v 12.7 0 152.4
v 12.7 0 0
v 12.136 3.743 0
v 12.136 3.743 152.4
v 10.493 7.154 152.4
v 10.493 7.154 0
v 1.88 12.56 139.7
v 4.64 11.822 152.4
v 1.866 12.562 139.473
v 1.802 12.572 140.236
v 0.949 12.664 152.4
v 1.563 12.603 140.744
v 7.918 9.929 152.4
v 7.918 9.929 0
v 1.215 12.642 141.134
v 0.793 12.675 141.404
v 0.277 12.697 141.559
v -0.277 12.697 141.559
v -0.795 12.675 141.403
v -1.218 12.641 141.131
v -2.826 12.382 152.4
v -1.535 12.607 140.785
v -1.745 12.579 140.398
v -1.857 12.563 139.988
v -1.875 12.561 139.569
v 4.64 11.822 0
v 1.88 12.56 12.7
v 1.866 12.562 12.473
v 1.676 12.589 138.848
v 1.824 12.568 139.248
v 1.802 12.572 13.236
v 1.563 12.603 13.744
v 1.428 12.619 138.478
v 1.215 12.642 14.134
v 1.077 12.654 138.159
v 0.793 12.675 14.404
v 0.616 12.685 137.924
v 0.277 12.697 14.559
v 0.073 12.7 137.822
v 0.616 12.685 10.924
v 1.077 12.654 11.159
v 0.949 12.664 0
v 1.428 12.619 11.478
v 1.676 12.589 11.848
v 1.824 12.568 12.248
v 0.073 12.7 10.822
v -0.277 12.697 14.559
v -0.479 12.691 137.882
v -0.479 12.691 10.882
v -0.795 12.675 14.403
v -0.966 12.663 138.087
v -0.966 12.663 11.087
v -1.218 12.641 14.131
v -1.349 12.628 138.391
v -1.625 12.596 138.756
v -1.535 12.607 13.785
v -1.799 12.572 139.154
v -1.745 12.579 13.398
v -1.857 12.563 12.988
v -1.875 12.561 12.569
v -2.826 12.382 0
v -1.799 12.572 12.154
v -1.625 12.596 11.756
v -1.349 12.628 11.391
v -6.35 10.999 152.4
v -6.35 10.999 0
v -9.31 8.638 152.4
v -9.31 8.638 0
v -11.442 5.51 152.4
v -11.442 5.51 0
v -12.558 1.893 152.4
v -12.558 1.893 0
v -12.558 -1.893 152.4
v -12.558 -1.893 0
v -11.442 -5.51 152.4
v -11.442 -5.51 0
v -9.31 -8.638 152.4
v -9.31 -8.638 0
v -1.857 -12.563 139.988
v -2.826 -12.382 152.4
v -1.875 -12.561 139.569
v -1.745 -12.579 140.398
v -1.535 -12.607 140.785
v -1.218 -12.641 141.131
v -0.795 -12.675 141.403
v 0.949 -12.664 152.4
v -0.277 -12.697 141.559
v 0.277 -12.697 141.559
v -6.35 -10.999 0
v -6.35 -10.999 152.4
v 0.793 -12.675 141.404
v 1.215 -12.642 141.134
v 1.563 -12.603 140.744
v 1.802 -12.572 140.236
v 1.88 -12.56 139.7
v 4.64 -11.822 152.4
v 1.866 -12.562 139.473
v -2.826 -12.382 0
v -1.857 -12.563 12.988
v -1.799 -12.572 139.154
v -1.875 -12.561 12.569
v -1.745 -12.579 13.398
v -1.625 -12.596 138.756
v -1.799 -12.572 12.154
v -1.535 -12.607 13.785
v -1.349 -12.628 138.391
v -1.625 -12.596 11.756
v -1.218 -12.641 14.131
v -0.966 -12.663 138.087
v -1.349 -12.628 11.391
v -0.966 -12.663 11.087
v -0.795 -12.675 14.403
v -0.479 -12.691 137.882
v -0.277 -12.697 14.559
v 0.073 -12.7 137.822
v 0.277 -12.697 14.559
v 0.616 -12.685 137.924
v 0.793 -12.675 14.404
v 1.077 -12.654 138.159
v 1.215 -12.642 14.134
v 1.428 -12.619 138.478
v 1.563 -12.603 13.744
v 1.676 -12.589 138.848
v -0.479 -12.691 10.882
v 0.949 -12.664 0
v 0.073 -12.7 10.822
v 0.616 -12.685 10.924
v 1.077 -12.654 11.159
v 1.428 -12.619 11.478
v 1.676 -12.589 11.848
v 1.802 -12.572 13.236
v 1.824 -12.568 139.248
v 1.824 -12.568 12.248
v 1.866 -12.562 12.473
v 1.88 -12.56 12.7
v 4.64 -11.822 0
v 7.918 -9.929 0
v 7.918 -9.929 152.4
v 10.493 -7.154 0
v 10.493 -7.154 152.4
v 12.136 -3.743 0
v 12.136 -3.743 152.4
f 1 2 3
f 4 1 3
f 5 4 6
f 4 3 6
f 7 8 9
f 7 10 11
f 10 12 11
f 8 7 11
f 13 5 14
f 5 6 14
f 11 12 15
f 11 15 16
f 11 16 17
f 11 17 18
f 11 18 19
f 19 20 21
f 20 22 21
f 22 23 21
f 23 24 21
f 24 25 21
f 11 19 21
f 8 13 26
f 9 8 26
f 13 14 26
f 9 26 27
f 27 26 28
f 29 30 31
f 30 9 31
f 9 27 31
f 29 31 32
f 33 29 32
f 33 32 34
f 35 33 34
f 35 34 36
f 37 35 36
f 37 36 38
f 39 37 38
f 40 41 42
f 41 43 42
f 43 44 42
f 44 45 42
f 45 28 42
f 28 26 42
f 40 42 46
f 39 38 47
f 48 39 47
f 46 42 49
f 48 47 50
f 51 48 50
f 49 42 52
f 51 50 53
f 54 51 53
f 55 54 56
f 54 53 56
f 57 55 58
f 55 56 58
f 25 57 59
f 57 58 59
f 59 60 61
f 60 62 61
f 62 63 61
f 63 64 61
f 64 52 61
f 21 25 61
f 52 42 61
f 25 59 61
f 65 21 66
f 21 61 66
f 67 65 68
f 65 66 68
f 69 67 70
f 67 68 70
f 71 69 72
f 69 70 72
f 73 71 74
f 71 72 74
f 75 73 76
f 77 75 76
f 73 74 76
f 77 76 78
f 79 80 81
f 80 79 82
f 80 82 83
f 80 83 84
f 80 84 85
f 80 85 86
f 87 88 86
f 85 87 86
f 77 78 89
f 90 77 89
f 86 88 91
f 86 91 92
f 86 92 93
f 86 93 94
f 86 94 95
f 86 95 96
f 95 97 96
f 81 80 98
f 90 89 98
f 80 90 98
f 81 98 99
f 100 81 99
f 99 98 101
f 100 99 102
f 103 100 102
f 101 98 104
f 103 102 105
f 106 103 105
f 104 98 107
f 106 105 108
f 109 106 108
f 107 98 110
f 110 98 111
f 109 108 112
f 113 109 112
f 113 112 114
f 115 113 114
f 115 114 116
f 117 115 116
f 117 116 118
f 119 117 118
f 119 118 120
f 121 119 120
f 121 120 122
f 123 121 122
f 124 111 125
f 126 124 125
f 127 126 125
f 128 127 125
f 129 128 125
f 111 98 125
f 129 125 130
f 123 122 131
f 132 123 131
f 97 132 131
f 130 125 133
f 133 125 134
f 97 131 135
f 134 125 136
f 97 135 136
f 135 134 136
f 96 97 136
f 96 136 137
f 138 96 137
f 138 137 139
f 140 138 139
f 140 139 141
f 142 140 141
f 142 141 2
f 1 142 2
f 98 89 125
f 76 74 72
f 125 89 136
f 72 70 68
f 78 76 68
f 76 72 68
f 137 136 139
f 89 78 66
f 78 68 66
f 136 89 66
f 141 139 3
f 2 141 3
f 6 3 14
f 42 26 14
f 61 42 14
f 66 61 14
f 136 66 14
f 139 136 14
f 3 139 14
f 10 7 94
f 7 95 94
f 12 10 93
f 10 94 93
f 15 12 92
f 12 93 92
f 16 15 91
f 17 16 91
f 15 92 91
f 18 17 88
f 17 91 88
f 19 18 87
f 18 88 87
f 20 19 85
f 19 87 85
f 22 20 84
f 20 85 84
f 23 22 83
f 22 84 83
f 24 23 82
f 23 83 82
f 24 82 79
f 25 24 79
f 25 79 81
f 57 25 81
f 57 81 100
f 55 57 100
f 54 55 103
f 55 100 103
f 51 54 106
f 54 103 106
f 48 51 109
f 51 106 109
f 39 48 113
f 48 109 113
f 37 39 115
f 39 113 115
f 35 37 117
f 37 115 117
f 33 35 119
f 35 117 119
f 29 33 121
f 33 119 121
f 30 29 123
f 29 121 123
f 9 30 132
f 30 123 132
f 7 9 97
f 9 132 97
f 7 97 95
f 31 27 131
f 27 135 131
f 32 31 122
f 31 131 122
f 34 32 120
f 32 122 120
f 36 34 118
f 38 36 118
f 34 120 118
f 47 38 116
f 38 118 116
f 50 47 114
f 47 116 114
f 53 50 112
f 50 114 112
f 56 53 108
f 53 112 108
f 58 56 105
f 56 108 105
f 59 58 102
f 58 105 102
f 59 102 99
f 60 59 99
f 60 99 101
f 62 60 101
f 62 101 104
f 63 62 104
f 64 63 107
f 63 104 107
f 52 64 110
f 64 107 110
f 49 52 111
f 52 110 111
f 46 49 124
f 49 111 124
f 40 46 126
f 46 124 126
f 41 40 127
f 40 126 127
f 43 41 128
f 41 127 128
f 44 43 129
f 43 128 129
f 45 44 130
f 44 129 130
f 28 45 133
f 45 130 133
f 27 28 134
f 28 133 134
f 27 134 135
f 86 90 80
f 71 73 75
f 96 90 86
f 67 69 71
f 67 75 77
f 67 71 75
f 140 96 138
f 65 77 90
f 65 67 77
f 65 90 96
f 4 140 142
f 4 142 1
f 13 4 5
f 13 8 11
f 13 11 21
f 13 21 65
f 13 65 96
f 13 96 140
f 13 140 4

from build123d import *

# Parameters (mm, degrees)
F0_R     = 12.7
F1_DEPTH = 152.4
F2_R     = 1.8796
F3_DEPTH = 25.4
F4_R     = 1.8796
F5_DEPTH = 25.4


with BuildPart() as f1:
    # F0 (on Top) → F1 (new body)
    with BuildSketch(Plane.XY):
        Circle(F0_R)
    extrude(amount=F1_DEPTH)

    # F2 (on Front) → F3 (cut, symmetric)
    with BuildSketch(Plane.XZ):
        with Locations((0, 12.7)):
            Circle(F2_R)
    extrude(amount=F3_DEPTH, both=True, mode=Mode.SUBTRACT)

    # F4 (on Front) → F5 (cut, symmetric)
    with BuildSketch(Plane.XZ):
        with Locations((0, 139.7)):
            Circle(F4_R)
    extrude(amount=F5_DEPTH, both=True, mode=Mode.SUBTRACT)


solid = f1.part
